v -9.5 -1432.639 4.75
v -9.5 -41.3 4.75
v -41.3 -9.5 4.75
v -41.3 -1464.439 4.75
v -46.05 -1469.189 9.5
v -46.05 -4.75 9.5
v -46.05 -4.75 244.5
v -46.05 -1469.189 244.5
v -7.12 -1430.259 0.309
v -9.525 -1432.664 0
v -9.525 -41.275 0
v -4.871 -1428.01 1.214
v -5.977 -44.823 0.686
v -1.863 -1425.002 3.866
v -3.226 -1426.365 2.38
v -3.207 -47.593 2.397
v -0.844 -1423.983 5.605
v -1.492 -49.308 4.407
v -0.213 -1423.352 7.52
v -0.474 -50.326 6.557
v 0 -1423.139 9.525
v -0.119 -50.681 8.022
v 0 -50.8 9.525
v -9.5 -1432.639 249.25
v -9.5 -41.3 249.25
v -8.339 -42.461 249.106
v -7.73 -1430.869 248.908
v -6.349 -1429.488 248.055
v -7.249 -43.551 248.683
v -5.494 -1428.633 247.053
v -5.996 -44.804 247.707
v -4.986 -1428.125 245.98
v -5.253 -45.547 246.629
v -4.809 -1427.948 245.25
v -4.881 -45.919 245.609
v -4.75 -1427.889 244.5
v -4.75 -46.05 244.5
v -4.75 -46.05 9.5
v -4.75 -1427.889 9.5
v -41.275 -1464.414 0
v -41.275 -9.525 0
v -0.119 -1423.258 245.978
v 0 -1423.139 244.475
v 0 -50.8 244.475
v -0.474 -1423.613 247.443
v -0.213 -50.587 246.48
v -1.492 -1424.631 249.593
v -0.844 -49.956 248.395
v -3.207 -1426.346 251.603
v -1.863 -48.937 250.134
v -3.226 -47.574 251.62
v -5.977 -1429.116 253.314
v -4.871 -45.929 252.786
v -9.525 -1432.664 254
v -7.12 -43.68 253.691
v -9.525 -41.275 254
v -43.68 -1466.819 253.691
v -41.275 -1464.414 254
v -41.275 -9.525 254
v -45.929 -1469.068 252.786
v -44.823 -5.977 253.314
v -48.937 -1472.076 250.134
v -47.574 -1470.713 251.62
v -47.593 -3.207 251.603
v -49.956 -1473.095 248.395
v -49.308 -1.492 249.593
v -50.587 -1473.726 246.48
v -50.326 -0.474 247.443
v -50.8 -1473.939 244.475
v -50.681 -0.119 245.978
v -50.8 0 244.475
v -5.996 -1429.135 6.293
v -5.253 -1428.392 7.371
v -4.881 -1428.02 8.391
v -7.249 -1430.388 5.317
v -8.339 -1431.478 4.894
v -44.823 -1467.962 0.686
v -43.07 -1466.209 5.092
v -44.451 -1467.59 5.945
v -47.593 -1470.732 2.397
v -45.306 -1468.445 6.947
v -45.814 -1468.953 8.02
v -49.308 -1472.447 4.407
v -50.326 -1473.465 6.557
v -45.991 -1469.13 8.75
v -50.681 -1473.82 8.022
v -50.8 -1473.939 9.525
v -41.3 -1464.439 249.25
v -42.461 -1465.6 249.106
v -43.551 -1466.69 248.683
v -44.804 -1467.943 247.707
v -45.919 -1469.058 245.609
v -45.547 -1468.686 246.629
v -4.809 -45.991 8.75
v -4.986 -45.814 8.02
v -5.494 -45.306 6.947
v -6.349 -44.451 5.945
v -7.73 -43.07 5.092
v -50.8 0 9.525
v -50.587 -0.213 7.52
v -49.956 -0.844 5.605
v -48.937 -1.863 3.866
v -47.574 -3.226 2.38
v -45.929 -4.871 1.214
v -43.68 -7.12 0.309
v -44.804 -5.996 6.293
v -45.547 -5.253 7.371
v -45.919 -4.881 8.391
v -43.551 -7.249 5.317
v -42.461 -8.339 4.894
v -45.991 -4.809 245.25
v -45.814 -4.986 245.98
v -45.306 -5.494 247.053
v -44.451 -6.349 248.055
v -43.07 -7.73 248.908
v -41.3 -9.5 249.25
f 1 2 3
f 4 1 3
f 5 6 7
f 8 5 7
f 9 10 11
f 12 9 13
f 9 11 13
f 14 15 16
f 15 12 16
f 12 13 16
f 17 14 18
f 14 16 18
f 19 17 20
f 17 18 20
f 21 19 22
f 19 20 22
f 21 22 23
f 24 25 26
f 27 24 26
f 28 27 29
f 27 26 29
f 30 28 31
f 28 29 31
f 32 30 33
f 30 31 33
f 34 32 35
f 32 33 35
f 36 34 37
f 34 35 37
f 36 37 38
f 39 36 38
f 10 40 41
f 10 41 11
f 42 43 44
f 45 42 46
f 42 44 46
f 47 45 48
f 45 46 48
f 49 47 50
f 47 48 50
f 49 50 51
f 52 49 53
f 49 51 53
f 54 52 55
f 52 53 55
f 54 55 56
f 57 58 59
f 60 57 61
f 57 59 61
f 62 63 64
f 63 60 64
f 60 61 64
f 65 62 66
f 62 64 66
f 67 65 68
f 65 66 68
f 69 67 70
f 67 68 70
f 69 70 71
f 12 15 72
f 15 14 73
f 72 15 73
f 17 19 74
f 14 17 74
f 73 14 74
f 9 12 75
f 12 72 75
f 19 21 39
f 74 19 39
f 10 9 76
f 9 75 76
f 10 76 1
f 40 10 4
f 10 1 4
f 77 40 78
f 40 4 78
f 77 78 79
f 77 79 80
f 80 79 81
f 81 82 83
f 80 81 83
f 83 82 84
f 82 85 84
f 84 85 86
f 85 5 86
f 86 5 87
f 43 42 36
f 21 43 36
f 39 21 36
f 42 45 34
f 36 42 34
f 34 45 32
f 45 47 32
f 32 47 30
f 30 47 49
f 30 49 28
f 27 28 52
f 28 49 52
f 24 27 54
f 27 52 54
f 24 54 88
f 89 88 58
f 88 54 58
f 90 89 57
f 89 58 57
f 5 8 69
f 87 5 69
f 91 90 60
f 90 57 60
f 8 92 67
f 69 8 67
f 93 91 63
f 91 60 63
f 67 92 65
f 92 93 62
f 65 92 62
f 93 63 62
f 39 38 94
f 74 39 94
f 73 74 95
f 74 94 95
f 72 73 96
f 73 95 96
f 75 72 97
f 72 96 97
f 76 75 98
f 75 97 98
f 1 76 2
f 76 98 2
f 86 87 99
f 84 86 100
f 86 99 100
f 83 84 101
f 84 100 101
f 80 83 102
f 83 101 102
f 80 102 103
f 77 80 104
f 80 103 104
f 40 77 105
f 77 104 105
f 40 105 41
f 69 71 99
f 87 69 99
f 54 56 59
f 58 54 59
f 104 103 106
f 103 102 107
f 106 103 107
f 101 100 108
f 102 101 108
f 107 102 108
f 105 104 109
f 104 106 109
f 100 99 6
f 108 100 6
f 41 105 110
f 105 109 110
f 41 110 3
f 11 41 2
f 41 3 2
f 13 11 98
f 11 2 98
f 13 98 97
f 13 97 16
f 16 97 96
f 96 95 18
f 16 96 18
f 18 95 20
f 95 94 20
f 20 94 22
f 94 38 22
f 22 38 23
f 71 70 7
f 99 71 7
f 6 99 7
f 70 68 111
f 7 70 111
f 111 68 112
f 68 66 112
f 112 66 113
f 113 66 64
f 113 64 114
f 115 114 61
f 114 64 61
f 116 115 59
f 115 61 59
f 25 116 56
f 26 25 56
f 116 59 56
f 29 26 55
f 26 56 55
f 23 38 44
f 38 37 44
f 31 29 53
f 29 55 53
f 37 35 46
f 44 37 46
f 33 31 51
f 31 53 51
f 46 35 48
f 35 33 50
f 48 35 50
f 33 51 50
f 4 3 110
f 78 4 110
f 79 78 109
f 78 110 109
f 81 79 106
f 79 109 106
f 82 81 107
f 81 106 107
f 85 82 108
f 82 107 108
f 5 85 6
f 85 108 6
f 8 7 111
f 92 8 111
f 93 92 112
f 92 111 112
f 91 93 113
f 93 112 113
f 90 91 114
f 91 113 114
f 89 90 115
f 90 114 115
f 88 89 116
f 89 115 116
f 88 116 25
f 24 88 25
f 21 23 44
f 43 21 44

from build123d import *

# Parameters (mm, degrees)
F1_DEPTH = 1473.939
F3_DEPTH = 254.001
F5_DEPTH = 6.35


with BuildPart() as f1:
    # F0 (on Front) → F1 (new body)
    with BuildSketch(Plane.XZ):
        with BuildLine():
            Line((-41.275, 0), (-9.525, 0))
            ThreePointArc((-9.525, 0), (-2.789808, 2.789808), (0, 9.525))
            Line((0, 9.525), (0, 244.475))
            ThreePointArc((0, 244.475), (-2.789808, 251.210192), (-9.525, 254))
            Line((-9.525, 254), (-41.275, 254))
            ThreePointArc((-41.275, 254), (-48.010192, 251.210192), (-50.8, 244.475))
            Line((-50.8, 244.475), (-50.8, 9.525))
            ThreePointArc((-50.8, 9.525), (-48.010192, 2.789808), (-41.275, 0))
        make_face()
        with BuildLine():
            ThreePointArc((-46.0502, 244.5004), (-44.659016, 247.859016), (-41.3004, 249.2502))
            Line((-41.3004, 249.2502), (-9.4996, 249.2502))
            ThreePointArc((-9.4996, 249.2502), (-6.140984, 247.859016), (-4.7498, 244.5004))
            Line((-4.7498, 244.5004), (-4.7498, 9.4996))
            ThreePointArc((-4.7498, 9.4996), (-6.140984, 6.140984), (-9.4996, 4.7498))
            Line((-9.4996, 4.7498), (-41.3004, 4.7498))
            ThreePointArc((-41.3004, 4.7498), (-44.659016, 6.140984), (-46.0502, 9.4996))
            Line((-46.0502, 9.4996), (-46.0502, 244.5004))
        make_face(mode=Mode.SUBTRACT)
    extrude(amount=F1_DEPTH)

    # F2 (on face) → F3 (cut, through all)
    with BuildSketch(Plane.XY.offset(254)):
        Polygon((0, -1423.139), (-50.8, -1473.939), (0, -1473.939), align=None)
        Polygon((0, 0), (-50.8, 0), (0, -50.8), align=None)
    extrude(amount=-F3_DEPTH, mode=Mode.SUBTRACT)


with BuildPart() as f5:
    # F4 (on face) → F5 (new body)
    with BuildSketch(Plane.YZ):
        with BuildLine():
            ThreePointArc((-262.900179, 386.417484), (-267.477327, 385.56399), (-271.439268, 383.118226))
            Line((-271.439268, 383.118226), (-298.414744, 358.615267))
            ThreePointArc((-298.414744, 358.615267), (-301.488932, 354.354737), (-302.575654, 349.214525))
            Line((-302.575654, 349.214525), (-302.575654, 238.994726))
            ThreePointArc((-302.575654, 238.994726), (-298.85591, 230.01447), (-289.875654, 226.294726))
            Line((-289.875654, 226.294726), (-220.098802, 226.294726))
            ThreePointArc((-220.098802, 226.294726), (-211.118546, 230.01447), (-207.398802, 238.994726))
            Line((-207.398802, 238.994726), (-207.398802, 373.717484))
            ThreePointArc((-207.398802, 373.717484), (-211.118546, 382.69774), (-220.098802, 386.417484))
            Line((-220.098802, 386.417484), (-262.900179, 386.417484))
        make_face()
    extrude(amount=F5_DEPTH)


with BuildPart() as f6_1:
    # F6: copy of F5
    add(f5.part)


solid = f1.part
